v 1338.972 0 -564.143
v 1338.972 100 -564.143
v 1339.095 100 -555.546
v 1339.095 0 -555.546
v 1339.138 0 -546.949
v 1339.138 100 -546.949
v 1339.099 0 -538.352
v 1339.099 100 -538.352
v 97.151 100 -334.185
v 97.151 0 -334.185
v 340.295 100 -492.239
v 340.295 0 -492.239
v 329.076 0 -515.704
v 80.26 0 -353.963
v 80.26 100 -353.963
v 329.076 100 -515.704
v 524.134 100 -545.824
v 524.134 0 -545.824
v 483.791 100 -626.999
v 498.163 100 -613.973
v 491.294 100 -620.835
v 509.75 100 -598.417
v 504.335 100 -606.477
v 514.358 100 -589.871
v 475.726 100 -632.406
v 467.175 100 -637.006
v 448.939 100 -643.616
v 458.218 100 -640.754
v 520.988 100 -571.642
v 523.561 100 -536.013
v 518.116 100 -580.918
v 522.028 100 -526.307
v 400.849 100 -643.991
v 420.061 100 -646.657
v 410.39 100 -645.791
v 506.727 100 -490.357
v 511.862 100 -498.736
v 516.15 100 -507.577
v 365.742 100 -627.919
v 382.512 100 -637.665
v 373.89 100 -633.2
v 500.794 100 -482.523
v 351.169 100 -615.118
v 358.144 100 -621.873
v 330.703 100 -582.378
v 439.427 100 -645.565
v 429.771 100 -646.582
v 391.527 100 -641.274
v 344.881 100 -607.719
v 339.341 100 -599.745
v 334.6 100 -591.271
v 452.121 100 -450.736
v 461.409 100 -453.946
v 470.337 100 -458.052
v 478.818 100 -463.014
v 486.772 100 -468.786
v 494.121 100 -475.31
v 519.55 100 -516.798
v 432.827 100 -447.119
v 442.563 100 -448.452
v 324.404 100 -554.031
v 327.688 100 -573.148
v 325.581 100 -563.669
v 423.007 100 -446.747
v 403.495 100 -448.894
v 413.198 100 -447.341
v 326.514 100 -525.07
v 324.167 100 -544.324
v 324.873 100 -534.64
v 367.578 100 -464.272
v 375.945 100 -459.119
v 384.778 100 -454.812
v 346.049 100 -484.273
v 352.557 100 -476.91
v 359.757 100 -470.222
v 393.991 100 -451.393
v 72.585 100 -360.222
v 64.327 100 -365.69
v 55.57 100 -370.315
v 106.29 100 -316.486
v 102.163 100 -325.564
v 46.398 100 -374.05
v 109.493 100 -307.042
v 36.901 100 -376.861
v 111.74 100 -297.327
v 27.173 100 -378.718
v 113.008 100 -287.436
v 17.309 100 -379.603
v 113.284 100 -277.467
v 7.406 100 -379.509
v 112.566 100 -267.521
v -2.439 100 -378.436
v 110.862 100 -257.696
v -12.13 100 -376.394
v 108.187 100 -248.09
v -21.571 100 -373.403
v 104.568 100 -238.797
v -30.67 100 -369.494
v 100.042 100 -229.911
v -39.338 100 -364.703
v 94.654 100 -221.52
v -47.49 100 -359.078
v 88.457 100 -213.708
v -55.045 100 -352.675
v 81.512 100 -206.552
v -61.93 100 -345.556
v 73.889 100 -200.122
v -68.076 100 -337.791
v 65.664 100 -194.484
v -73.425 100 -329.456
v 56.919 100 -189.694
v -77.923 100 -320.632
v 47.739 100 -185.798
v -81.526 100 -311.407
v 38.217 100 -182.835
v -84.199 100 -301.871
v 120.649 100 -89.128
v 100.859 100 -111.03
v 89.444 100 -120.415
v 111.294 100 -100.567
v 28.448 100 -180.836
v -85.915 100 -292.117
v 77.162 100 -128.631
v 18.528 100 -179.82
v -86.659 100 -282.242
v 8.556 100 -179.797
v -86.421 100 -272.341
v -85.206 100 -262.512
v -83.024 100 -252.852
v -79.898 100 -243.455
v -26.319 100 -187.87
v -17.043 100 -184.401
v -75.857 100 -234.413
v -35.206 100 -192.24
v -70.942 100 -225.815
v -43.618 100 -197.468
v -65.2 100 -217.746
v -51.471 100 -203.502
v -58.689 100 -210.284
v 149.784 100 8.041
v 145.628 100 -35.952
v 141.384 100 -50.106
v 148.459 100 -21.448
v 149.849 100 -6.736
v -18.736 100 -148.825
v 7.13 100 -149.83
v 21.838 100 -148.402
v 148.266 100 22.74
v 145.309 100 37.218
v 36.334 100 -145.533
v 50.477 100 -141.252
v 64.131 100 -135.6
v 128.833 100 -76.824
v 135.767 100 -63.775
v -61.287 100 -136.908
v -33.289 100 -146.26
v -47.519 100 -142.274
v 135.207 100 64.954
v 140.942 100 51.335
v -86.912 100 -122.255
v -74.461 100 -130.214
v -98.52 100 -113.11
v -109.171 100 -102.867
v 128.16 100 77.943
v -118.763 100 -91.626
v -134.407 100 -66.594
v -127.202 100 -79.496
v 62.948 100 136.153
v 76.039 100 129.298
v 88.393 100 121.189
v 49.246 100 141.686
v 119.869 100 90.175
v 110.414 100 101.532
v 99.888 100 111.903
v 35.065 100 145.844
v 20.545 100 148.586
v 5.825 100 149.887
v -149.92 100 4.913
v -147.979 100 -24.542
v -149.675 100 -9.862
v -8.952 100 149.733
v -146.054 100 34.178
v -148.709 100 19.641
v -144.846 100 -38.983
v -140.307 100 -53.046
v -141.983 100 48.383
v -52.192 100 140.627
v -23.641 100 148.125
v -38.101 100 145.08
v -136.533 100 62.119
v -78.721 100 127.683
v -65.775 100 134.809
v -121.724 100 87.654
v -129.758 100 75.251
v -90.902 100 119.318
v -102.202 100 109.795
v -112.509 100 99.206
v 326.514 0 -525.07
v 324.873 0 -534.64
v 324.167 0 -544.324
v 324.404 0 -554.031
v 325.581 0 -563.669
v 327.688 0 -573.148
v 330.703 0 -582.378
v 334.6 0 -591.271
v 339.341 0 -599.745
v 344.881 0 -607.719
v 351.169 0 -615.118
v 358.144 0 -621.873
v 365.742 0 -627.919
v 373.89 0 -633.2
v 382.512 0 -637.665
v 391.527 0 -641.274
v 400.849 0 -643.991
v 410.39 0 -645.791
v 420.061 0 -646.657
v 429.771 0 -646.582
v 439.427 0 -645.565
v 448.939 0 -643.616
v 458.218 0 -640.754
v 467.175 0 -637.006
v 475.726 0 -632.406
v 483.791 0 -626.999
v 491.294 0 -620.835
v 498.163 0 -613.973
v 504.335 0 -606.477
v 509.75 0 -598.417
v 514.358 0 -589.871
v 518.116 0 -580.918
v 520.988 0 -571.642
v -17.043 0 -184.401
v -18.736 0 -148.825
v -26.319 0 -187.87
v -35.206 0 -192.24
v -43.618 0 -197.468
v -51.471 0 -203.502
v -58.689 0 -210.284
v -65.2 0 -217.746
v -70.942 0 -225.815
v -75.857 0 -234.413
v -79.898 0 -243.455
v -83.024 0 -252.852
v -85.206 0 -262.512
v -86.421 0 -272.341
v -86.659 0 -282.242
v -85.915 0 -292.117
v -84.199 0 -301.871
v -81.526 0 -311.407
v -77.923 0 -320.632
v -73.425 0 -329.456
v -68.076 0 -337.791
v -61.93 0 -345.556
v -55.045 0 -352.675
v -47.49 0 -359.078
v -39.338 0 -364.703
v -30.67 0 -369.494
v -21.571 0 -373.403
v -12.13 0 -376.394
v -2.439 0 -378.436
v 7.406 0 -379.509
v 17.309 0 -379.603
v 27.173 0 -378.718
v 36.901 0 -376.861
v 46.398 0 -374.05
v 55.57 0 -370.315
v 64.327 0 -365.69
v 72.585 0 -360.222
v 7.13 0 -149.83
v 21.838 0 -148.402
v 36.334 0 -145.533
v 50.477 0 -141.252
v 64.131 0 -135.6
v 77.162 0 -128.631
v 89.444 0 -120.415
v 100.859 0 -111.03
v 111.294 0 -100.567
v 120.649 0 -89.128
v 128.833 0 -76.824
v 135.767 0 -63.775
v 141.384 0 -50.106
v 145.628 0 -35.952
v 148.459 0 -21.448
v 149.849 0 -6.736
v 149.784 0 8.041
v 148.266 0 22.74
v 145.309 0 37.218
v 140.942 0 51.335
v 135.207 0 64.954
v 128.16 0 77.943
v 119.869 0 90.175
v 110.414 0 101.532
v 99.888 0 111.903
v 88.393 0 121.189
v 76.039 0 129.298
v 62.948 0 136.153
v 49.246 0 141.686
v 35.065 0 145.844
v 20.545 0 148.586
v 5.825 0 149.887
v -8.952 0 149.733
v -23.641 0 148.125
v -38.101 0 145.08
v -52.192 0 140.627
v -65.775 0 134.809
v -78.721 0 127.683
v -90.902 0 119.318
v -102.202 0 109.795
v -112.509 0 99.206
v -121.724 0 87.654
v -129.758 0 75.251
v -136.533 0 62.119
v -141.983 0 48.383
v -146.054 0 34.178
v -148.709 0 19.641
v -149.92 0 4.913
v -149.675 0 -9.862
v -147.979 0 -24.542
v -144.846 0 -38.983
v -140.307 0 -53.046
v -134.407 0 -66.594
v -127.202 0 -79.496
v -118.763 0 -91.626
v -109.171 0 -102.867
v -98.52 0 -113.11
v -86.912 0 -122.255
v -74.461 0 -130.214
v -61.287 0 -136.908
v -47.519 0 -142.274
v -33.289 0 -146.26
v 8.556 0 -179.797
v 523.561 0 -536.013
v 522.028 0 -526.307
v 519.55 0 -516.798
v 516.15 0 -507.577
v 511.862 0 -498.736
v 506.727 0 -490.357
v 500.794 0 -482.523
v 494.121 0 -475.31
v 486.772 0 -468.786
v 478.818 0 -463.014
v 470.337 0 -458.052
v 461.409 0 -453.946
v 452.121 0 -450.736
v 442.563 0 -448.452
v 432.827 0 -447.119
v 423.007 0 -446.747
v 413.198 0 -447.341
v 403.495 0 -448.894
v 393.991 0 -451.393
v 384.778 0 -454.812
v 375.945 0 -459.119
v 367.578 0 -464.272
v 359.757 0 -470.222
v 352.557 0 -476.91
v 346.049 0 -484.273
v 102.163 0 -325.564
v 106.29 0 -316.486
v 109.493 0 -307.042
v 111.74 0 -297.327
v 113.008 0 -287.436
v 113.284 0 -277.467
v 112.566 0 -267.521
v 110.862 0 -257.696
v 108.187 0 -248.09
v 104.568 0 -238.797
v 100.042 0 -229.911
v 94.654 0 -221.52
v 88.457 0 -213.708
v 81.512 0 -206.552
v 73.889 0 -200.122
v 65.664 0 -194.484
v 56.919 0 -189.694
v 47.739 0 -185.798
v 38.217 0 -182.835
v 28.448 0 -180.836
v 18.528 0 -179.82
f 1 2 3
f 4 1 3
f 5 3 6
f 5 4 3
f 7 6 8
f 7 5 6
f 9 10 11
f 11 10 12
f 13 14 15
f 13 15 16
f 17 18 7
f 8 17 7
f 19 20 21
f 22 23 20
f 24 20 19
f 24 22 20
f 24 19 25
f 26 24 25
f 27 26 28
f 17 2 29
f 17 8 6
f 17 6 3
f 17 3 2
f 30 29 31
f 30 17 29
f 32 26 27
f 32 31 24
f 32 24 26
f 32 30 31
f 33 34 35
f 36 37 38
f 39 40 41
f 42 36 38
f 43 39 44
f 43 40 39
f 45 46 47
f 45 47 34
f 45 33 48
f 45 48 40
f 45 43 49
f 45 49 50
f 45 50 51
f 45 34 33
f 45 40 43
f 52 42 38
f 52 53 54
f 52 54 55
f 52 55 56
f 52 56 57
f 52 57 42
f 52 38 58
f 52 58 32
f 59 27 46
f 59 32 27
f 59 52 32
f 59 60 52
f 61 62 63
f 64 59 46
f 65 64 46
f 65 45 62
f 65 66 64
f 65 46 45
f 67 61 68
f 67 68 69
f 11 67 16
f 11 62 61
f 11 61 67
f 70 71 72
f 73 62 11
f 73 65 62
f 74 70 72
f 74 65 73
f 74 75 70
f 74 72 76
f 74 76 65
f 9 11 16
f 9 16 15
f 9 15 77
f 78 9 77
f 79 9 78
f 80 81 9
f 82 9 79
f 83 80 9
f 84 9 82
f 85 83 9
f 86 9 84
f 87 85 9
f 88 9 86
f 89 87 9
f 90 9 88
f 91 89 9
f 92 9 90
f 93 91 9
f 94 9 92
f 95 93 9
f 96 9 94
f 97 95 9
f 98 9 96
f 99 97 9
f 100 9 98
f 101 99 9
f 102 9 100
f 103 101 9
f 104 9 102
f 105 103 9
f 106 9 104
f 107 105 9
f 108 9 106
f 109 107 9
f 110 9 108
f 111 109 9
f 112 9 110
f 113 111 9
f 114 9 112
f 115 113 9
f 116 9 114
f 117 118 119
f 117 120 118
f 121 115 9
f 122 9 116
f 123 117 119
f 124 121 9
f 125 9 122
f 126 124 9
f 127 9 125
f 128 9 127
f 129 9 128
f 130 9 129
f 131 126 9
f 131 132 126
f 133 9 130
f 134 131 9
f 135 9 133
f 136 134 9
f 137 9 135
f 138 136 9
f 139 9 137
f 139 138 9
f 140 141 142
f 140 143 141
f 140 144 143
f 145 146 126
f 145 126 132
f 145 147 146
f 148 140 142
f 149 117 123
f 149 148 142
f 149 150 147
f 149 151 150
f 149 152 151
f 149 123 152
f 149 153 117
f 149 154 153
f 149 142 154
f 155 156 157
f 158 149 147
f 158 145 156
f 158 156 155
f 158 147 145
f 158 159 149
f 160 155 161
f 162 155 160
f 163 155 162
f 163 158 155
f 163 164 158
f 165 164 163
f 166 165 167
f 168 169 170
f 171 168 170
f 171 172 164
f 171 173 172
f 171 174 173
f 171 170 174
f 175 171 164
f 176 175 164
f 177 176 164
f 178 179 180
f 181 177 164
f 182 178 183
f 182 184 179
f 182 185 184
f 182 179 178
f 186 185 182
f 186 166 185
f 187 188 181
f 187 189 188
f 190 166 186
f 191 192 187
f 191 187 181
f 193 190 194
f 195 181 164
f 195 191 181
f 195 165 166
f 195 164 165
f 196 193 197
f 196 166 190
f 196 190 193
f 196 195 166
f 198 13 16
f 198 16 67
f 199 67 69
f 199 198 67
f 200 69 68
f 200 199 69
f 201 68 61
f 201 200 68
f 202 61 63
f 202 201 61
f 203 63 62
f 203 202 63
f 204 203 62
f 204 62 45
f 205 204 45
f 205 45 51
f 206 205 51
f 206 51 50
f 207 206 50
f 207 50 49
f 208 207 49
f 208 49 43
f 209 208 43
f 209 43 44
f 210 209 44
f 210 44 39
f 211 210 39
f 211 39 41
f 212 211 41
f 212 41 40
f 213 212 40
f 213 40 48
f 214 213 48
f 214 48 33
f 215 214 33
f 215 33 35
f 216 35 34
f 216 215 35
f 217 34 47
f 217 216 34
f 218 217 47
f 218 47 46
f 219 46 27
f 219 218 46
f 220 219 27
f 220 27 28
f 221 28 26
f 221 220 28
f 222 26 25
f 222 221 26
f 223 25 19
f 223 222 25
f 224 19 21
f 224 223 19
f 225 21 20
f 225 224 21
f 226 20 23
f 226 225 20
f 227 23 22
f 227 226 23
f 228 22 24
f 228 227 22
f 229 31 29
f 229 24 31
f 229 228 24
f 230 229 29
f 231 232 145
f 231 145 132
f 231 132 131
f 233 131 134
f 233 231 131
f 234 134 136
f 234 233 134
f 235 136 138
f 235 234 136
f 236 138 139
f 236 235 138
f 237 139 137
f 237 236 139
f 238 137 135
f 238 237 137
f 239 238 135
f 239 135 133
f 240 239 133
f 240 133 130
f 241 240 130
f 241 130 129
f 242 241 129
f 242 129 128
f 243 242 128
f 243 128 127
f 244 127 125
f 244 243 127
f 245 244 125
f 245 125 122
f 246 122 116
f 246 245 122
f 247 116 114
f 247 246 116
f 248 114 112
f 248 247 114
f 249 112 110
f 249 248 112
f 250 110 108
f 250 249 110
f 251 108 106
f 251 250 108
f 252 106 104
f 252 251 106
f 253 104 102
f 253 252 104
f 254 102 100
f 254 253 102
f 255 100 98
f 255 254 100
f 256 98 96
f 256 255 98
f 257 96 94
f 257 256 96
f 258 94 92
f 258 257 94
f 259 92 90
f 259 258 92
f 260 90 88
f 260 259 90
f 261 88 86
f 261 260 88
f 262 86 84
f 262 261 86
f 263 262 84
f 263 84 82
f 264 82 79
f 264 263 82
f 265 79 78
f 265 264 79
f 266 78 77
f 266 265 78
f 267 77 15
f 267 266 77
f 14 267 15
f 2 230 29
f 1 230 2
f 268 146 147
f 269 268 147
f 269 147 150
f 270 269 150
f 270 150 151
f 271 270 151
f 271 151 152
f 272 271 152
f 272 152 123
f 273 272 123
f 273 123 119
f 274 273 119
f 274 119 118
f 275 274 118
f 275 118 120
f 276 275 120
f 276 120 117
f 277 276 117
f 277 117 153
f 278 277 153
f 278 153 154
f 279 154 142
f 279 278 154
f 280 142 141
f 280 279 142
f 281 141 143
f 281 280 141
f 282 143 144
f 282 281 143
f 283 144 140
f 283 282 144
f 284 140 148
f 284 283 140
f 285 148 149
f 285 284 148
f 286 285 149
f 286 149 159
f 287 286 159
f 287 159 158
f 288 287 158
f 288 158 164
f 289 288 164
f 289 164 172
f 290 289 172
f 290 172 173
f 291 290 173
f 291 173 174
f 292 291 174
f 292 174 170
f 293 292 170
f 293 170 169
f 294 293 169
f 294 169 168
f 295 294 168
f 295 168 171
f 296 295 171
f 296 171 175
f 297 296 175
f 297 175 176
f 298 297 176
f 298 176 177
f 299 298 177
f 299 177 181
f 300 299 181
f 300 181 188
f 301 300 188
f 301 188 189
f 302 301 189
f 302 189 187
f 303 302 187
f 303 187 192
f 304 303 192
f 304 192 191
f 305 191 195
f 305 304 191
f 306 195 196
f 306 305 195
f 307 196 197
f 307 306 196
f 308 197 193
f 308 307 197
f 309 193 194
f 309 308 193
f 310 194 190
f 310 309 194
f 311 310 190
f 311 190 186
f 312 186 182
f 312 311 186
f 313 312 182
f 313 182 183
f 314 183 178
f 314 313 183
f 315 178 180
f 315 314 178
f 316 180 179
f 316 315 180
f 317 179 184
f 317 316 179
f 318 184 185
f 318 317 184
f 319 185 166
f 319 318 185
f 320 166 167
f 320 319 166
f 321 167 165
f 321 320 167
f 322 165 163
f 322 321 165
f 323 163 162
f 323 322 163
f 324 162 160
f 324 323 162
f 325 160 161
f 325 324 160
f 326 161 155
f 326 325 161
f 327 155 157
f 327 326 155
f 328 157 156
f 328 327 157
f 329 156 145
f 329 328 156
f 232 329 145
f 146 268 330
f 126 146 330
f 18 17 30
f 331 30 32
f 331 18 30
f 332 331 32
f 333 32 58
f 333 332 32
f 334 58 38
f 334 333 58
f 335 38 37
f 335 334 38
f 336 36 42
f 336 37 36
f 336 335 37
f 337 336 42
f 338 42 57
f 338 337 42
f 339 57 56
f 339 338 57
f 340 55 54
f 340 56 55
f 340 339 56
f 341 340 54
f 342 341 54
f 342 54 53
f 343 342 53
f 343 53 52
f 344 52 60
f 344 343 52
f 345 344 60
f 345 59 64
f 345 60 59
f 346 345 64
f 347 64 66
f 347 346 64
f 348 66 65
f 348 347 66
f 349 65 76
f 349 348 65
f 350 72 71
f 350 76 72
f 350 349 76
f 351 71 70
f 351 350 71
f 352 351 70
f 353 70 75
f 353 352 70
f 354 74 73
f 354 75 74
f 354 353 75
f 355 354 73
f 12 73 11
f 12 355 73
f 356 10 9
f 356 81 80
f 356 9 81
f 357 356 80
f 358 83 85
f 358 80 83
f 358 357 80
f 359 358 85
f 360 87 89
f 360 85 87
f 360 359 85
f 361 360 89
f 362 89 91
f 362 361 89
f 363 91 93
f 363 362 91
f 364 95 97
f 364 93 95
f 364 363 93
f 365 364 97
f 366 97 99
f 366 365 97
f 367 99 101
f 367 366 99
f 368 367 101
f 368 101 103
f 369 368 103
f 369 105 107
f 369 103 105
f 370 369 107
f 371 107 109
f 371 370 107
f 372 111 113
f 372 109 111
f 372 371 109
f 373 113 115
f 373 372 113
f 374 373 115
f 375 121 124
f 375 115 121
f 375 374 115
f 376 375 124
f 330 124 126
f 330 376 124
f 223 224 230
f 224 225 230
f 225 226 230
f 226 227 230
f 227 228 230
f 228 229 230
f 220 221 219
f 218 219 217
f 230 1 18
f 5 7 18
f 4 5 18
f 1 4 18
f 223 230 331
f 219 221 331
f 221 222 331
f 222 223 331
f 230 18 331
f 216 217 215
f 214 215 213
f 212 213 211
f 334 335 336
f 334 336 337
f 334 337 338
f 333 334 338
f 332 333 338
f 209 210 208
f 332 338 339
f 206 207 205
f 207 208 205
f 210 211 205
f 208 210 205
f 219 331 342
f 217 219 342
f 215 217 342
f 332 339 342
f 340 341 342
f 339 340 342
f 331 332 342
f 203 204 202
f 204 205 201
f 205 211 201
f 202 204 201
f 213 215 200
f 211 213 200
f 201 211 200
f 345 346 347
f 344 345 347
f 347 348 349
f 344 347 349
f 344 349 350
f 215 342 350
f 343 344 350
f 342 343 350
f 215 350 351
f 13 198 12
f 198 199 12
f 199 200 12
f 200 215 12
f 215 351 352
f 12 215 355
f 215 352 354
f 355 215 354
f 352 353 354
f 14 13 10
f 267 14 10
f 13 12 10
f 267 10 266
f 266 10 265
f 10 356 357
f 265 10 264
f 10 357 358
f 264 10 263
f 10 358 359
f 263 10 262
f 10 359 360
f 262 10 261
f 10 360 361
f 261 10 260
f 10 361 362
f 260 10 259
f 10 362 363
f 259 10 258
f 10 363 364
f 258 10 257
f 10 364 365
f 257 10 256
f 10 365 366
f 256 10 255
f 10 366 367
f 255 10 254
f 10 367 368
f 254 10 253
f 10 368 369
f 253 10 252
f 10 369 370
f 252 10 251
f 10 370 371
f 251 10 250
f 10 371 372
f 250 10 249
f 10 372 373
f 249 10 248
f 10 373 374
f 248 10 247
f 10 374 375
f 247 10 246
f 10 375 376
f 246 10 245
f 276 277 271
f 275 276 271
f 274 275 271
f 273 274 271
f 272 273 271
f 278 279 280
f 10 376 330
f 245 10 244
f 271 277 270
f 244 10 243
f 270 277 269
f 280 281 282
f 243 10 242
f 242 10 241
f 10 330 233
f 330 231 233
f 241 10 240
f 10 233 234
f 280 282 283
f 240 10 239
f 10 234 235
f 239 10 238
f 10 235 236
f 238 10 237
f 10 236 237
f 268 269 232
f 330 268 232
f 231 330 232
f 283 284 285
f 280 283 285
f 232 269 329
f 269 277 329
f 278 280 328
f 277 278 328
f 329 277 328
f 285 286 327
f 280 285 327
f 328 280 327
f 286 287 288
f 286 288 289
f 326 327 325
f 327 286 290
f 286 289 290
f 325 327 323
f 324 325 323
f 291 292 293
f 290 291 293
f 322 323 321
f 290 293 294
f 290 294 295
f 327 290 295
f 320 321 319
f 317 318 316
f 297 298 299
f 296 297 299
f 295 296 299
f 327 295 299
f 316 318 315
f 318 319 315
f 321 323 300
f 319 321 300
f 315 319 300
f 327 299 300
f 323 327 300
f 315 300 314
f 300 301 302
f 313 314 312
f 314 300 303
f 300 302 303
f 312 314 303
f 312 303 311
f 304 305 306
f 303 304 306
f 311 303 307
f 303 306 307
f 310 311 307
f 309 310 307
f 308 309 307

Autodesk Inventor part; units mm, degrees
ref_plane "YZ Plane" through (0, 0, 0) normal (1, 0, 0) x (0, 1, 0)
ref_plane "XZ Plane" through (0, 0, 0) normal (0, 1, 0) x (-1, 0, 0)
ref_plane "XY Plane" through (0, 0, 0) normal (0, 0, 1) x (1, 0, 0)
sketch "Sketch1" plane through (0, 0, 0) normal (0, 1, 0) x (-1, 0, 0)
  circle A0 centre (0, 0) radius 150
  circle A1 centre (-13.3087, -279.6835) radius 100
  circle A2 centre (-424.1378, -546.7404) radius 100
  line L0 (0, 0) -> (-13.3087, -279.6835)
  line L1 (-13.3087, -279.6835) -> (-424.1378, -546.7404)
  line L2 (-424.1378, -546.7404) -> (-1339.0994, -538.3521)
  arc A3 (-1324.0769, -381.4083) -> (-1301.514, -806.4251) centre (-424.1378, -546.7404) ccw
  line L3 (25.7594, -1.2258) -> (11.8229, -294.1053)
  line L4 (11.8229, -294.1053) -> (-416.6006, -572.5992)
  line L5 (-416.6006, -572.5992) -> (-1338.9723, -564.1429)
  arc A4 (25.7594, -1.2258) -> (0, 0) centre (12.8797, -0.6129) ccw
  dimension "d0" = 300
  dimension "d1" = 200
  dimension "d2" = 200
  dimension "d3" = 490
  dimension "d4" = 280
  dimension "d10" = 915
extrude "Extrusion1" add sketch "Sketch1" along normal blind 100
properties part number "95thMaleTemplate"
